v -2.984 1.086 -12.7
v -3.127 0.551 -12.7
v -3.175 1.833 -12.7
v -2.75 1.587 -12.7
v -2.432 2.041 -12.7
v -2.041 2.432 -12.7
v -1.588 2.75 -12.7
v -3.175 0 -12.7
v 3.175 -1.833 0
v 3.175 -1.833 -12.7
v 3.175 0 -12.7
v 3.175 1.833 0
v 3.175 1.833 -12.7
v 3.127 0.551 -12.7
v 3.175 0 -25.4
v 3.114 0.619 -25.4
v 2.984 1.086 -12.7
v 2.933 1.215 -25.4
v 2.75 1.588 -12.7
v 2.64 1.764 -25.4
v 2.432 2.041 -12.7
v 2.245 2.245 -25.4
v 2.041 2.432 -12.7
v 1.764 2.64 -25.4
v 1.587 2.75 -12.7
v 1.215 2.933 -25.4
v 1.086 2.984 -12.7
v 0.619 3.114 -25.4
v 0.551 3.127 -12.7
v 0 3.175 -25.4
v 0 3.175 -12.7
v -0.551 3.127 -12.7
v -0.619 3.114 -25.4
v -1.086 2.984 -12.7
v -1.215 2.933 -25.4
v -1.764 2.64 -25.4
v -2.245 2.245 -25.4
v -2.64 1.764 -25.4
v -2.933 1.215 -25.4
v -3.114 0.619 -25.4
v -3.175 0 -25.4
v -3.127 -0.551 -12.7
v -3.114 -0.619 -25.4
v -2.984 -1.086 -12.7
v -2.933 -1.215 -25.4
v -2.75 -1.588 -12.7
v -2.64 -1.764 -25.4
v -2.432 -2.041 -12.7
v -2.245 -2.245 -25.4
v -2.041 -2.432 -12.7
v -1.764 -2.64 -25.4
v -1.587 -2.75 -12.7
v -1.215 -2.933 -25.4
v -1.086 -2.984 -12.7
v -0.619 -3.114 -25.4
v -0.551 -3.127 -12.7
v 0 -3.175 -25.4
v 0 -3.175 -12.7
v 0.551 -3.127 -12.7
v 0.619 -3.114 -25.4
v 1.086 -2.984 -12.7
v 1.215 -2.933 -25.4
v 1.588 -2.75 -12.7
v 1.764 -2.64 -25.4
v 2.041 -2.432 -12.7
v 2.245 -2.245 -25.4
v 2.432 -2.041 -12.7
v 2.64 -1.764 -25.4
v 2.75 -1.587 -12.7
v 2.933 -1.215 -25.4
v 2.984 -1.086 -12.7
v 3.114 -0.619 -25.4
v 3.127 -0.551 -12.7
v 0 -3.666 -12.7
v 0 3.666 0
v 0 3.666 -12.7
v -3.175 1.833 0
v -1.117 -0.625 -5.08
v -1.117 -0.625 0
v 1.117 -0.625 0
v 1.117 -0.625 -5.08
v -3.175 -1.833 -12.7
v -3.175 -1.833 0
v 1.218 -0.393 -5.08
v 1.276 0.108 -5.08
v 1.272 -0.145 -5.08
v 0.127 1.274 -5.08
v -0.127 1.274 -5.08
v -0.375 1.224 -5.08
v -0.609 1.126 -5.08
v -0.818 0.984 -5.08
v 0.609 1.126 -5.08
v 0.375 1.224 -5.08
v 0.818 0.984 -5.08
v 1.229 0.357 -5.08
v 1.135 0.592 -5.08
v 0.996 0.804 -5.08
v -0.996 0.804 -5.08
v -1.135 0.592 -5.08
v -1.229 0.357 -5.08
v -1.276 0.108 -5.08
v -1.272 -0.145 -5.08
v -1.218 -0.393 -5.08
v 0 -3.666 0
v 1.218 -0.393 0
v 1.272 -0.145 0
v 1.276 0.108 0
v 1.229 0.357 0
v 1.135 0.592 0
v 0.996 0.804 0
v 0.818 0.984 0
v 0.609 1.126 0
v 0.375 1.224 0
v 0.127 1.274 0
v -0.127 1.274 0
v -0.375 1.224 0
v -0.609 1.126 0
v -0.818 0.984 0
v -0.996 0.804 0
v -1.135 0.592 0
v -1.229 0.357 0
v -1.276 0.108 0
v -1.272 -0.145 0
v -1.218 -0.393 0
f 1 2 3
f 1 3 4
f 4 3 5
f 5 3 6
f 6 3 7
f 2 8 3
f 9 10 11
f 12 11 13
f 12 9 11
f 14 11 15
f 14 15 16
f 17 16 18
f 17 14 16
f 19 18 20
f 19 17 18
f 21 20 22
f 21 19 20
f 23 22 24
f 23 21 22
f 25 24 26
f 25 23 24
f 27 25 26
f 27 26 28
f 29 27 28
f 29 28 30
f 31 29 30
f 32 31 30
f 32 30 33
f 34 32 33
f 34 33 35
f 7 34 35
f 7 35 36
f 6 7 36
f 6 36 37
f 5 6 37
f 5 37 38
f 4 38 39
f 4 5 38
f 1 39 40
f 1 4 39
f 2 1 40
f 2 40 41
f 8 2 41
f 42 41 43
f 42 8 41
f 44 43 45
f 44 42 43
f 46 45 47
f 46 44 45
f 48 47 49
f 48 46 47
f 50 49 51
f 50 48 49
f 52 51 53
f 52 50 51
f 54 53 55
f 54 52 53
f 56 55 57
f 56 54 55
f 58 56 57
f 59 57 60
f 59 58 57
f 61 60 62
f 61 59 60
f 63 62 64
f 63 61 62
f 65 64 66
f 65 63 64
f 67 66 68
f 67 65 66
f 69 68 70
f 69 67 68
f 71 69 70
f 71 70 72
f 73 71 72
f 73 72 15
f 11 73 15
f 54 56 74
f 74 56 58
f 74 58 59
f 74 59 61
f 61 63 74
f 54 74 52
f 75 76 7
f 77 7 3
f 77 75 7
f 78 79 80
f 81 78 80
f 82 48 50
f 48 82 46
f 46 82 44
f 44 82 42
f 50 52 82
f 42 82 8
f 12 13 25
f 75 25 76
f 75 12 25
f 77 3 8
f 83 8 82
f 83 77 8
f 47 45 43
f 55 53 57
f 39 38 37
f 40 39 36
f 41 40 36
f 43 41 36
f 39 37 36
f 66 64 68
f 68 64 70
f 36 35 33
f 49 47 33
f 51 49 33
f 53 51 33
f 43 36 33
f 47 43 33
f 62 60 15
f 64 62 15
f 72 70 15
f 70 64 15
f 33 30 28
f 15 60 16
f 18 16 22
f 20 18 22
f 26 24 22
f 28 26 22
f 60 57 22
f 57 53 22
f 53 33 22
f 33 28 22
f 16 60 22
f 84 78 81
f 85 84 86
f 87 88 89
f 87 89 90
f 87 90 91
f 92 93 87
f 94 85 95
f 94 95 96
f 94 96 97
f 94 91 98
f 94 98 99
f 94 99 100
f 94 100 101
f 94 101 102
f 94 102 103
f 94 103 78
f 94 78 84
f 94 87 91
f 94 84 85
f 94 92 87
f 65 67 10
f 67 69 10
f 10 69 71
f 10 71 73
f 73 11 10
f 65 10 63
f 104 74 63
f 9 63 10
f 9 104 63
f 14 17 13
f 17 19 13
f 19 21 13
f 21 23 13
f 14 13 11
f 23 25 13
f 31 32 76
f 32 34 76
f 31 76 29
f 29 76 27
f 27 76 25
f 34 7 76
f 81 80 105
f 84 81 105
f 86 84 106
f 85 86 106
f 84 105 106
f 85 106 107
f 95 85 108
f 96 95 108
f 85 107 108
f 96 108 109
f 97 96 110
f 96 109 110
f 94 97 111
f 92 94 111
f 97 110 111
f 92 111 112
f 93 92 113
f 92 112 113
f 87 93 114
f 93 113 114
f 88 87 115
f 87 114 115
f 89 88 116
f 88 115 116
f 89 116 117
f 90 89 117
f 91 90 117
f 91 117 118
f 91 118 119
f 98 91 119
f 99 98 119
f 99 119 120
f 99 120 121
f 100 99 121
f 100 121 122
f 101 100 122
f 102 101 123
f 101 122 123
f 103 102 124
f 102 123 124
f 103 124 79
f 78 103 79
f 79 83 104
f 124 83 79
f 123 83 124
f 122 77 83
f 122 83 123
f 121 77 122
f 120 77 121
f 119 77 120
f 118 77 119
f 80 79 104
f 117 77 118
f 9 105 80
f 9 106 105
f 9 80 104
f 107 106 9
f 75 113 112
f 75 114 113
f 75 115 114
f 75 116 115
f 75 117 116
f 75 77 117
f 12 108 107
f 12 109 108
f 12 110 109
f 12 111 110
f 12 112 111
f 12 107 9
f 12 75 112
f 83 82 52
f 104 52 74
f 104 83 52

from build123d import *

# Parameters (mm, degrees)
BOSS_EXTRUDE1_DEPTH = 25.4
CUT_EXTRUDE1_DEPTH  = 5.08
SKETCH3_OUTSIDE_W   = 13.788
SKETCH3_OUTSIDE_H   = 14.77
SKETCH3_OUTSIDE_R   = 3.175
CUT_EXTRUDE2_DEPTH  = 13.7


with BuildPart() as part:
    # Sketch1 → Boss-Extrude1 (new body)
    with BuildSketch(Plane.XY):
        Polygon((0, 3.666174209), (-3.175, 1.833087105), (-3.175, -1.833087105), (0, -3.666174209), (3.175, -1.833087105), (3.175, 1.833087105), align=None)
    extrude(amount=-BOSS_EXTRUDE1_DEPTH)

    # Sketch2 → Cut-Extrude1 (cut)
    with BuildSketch(Plane.XY):
        with BuildLine():
            Line((-1.117311326, -0.62484), (1.117311326, -0.62484))
            ThreePointArc((1.117311326, -0.62484), (0, 1.28016), (-1.117311326, -0.62484))
        make_face()
    extrude(amount=-CUT_EXTRUDE1_DEPTH, mode=Mode.SUBTRACT)

    # Sketch3 outside → Cut-Extrude2 (cut, through all)
    with BuildSketch(Plane.XY.offset(-12.7)):
        Rectangle(SKETCH3_OUTSIDE_W, SKETCH3_OUTSIDE_H)
        Circle(SKETCH3_OUTSIDE_R, mode=Mode.SUBTRACT)
    extrude(amount=-CUT_EXTRUDE2_DEPTH, mode=Mode.SUBTRACT)


solid = part.part
